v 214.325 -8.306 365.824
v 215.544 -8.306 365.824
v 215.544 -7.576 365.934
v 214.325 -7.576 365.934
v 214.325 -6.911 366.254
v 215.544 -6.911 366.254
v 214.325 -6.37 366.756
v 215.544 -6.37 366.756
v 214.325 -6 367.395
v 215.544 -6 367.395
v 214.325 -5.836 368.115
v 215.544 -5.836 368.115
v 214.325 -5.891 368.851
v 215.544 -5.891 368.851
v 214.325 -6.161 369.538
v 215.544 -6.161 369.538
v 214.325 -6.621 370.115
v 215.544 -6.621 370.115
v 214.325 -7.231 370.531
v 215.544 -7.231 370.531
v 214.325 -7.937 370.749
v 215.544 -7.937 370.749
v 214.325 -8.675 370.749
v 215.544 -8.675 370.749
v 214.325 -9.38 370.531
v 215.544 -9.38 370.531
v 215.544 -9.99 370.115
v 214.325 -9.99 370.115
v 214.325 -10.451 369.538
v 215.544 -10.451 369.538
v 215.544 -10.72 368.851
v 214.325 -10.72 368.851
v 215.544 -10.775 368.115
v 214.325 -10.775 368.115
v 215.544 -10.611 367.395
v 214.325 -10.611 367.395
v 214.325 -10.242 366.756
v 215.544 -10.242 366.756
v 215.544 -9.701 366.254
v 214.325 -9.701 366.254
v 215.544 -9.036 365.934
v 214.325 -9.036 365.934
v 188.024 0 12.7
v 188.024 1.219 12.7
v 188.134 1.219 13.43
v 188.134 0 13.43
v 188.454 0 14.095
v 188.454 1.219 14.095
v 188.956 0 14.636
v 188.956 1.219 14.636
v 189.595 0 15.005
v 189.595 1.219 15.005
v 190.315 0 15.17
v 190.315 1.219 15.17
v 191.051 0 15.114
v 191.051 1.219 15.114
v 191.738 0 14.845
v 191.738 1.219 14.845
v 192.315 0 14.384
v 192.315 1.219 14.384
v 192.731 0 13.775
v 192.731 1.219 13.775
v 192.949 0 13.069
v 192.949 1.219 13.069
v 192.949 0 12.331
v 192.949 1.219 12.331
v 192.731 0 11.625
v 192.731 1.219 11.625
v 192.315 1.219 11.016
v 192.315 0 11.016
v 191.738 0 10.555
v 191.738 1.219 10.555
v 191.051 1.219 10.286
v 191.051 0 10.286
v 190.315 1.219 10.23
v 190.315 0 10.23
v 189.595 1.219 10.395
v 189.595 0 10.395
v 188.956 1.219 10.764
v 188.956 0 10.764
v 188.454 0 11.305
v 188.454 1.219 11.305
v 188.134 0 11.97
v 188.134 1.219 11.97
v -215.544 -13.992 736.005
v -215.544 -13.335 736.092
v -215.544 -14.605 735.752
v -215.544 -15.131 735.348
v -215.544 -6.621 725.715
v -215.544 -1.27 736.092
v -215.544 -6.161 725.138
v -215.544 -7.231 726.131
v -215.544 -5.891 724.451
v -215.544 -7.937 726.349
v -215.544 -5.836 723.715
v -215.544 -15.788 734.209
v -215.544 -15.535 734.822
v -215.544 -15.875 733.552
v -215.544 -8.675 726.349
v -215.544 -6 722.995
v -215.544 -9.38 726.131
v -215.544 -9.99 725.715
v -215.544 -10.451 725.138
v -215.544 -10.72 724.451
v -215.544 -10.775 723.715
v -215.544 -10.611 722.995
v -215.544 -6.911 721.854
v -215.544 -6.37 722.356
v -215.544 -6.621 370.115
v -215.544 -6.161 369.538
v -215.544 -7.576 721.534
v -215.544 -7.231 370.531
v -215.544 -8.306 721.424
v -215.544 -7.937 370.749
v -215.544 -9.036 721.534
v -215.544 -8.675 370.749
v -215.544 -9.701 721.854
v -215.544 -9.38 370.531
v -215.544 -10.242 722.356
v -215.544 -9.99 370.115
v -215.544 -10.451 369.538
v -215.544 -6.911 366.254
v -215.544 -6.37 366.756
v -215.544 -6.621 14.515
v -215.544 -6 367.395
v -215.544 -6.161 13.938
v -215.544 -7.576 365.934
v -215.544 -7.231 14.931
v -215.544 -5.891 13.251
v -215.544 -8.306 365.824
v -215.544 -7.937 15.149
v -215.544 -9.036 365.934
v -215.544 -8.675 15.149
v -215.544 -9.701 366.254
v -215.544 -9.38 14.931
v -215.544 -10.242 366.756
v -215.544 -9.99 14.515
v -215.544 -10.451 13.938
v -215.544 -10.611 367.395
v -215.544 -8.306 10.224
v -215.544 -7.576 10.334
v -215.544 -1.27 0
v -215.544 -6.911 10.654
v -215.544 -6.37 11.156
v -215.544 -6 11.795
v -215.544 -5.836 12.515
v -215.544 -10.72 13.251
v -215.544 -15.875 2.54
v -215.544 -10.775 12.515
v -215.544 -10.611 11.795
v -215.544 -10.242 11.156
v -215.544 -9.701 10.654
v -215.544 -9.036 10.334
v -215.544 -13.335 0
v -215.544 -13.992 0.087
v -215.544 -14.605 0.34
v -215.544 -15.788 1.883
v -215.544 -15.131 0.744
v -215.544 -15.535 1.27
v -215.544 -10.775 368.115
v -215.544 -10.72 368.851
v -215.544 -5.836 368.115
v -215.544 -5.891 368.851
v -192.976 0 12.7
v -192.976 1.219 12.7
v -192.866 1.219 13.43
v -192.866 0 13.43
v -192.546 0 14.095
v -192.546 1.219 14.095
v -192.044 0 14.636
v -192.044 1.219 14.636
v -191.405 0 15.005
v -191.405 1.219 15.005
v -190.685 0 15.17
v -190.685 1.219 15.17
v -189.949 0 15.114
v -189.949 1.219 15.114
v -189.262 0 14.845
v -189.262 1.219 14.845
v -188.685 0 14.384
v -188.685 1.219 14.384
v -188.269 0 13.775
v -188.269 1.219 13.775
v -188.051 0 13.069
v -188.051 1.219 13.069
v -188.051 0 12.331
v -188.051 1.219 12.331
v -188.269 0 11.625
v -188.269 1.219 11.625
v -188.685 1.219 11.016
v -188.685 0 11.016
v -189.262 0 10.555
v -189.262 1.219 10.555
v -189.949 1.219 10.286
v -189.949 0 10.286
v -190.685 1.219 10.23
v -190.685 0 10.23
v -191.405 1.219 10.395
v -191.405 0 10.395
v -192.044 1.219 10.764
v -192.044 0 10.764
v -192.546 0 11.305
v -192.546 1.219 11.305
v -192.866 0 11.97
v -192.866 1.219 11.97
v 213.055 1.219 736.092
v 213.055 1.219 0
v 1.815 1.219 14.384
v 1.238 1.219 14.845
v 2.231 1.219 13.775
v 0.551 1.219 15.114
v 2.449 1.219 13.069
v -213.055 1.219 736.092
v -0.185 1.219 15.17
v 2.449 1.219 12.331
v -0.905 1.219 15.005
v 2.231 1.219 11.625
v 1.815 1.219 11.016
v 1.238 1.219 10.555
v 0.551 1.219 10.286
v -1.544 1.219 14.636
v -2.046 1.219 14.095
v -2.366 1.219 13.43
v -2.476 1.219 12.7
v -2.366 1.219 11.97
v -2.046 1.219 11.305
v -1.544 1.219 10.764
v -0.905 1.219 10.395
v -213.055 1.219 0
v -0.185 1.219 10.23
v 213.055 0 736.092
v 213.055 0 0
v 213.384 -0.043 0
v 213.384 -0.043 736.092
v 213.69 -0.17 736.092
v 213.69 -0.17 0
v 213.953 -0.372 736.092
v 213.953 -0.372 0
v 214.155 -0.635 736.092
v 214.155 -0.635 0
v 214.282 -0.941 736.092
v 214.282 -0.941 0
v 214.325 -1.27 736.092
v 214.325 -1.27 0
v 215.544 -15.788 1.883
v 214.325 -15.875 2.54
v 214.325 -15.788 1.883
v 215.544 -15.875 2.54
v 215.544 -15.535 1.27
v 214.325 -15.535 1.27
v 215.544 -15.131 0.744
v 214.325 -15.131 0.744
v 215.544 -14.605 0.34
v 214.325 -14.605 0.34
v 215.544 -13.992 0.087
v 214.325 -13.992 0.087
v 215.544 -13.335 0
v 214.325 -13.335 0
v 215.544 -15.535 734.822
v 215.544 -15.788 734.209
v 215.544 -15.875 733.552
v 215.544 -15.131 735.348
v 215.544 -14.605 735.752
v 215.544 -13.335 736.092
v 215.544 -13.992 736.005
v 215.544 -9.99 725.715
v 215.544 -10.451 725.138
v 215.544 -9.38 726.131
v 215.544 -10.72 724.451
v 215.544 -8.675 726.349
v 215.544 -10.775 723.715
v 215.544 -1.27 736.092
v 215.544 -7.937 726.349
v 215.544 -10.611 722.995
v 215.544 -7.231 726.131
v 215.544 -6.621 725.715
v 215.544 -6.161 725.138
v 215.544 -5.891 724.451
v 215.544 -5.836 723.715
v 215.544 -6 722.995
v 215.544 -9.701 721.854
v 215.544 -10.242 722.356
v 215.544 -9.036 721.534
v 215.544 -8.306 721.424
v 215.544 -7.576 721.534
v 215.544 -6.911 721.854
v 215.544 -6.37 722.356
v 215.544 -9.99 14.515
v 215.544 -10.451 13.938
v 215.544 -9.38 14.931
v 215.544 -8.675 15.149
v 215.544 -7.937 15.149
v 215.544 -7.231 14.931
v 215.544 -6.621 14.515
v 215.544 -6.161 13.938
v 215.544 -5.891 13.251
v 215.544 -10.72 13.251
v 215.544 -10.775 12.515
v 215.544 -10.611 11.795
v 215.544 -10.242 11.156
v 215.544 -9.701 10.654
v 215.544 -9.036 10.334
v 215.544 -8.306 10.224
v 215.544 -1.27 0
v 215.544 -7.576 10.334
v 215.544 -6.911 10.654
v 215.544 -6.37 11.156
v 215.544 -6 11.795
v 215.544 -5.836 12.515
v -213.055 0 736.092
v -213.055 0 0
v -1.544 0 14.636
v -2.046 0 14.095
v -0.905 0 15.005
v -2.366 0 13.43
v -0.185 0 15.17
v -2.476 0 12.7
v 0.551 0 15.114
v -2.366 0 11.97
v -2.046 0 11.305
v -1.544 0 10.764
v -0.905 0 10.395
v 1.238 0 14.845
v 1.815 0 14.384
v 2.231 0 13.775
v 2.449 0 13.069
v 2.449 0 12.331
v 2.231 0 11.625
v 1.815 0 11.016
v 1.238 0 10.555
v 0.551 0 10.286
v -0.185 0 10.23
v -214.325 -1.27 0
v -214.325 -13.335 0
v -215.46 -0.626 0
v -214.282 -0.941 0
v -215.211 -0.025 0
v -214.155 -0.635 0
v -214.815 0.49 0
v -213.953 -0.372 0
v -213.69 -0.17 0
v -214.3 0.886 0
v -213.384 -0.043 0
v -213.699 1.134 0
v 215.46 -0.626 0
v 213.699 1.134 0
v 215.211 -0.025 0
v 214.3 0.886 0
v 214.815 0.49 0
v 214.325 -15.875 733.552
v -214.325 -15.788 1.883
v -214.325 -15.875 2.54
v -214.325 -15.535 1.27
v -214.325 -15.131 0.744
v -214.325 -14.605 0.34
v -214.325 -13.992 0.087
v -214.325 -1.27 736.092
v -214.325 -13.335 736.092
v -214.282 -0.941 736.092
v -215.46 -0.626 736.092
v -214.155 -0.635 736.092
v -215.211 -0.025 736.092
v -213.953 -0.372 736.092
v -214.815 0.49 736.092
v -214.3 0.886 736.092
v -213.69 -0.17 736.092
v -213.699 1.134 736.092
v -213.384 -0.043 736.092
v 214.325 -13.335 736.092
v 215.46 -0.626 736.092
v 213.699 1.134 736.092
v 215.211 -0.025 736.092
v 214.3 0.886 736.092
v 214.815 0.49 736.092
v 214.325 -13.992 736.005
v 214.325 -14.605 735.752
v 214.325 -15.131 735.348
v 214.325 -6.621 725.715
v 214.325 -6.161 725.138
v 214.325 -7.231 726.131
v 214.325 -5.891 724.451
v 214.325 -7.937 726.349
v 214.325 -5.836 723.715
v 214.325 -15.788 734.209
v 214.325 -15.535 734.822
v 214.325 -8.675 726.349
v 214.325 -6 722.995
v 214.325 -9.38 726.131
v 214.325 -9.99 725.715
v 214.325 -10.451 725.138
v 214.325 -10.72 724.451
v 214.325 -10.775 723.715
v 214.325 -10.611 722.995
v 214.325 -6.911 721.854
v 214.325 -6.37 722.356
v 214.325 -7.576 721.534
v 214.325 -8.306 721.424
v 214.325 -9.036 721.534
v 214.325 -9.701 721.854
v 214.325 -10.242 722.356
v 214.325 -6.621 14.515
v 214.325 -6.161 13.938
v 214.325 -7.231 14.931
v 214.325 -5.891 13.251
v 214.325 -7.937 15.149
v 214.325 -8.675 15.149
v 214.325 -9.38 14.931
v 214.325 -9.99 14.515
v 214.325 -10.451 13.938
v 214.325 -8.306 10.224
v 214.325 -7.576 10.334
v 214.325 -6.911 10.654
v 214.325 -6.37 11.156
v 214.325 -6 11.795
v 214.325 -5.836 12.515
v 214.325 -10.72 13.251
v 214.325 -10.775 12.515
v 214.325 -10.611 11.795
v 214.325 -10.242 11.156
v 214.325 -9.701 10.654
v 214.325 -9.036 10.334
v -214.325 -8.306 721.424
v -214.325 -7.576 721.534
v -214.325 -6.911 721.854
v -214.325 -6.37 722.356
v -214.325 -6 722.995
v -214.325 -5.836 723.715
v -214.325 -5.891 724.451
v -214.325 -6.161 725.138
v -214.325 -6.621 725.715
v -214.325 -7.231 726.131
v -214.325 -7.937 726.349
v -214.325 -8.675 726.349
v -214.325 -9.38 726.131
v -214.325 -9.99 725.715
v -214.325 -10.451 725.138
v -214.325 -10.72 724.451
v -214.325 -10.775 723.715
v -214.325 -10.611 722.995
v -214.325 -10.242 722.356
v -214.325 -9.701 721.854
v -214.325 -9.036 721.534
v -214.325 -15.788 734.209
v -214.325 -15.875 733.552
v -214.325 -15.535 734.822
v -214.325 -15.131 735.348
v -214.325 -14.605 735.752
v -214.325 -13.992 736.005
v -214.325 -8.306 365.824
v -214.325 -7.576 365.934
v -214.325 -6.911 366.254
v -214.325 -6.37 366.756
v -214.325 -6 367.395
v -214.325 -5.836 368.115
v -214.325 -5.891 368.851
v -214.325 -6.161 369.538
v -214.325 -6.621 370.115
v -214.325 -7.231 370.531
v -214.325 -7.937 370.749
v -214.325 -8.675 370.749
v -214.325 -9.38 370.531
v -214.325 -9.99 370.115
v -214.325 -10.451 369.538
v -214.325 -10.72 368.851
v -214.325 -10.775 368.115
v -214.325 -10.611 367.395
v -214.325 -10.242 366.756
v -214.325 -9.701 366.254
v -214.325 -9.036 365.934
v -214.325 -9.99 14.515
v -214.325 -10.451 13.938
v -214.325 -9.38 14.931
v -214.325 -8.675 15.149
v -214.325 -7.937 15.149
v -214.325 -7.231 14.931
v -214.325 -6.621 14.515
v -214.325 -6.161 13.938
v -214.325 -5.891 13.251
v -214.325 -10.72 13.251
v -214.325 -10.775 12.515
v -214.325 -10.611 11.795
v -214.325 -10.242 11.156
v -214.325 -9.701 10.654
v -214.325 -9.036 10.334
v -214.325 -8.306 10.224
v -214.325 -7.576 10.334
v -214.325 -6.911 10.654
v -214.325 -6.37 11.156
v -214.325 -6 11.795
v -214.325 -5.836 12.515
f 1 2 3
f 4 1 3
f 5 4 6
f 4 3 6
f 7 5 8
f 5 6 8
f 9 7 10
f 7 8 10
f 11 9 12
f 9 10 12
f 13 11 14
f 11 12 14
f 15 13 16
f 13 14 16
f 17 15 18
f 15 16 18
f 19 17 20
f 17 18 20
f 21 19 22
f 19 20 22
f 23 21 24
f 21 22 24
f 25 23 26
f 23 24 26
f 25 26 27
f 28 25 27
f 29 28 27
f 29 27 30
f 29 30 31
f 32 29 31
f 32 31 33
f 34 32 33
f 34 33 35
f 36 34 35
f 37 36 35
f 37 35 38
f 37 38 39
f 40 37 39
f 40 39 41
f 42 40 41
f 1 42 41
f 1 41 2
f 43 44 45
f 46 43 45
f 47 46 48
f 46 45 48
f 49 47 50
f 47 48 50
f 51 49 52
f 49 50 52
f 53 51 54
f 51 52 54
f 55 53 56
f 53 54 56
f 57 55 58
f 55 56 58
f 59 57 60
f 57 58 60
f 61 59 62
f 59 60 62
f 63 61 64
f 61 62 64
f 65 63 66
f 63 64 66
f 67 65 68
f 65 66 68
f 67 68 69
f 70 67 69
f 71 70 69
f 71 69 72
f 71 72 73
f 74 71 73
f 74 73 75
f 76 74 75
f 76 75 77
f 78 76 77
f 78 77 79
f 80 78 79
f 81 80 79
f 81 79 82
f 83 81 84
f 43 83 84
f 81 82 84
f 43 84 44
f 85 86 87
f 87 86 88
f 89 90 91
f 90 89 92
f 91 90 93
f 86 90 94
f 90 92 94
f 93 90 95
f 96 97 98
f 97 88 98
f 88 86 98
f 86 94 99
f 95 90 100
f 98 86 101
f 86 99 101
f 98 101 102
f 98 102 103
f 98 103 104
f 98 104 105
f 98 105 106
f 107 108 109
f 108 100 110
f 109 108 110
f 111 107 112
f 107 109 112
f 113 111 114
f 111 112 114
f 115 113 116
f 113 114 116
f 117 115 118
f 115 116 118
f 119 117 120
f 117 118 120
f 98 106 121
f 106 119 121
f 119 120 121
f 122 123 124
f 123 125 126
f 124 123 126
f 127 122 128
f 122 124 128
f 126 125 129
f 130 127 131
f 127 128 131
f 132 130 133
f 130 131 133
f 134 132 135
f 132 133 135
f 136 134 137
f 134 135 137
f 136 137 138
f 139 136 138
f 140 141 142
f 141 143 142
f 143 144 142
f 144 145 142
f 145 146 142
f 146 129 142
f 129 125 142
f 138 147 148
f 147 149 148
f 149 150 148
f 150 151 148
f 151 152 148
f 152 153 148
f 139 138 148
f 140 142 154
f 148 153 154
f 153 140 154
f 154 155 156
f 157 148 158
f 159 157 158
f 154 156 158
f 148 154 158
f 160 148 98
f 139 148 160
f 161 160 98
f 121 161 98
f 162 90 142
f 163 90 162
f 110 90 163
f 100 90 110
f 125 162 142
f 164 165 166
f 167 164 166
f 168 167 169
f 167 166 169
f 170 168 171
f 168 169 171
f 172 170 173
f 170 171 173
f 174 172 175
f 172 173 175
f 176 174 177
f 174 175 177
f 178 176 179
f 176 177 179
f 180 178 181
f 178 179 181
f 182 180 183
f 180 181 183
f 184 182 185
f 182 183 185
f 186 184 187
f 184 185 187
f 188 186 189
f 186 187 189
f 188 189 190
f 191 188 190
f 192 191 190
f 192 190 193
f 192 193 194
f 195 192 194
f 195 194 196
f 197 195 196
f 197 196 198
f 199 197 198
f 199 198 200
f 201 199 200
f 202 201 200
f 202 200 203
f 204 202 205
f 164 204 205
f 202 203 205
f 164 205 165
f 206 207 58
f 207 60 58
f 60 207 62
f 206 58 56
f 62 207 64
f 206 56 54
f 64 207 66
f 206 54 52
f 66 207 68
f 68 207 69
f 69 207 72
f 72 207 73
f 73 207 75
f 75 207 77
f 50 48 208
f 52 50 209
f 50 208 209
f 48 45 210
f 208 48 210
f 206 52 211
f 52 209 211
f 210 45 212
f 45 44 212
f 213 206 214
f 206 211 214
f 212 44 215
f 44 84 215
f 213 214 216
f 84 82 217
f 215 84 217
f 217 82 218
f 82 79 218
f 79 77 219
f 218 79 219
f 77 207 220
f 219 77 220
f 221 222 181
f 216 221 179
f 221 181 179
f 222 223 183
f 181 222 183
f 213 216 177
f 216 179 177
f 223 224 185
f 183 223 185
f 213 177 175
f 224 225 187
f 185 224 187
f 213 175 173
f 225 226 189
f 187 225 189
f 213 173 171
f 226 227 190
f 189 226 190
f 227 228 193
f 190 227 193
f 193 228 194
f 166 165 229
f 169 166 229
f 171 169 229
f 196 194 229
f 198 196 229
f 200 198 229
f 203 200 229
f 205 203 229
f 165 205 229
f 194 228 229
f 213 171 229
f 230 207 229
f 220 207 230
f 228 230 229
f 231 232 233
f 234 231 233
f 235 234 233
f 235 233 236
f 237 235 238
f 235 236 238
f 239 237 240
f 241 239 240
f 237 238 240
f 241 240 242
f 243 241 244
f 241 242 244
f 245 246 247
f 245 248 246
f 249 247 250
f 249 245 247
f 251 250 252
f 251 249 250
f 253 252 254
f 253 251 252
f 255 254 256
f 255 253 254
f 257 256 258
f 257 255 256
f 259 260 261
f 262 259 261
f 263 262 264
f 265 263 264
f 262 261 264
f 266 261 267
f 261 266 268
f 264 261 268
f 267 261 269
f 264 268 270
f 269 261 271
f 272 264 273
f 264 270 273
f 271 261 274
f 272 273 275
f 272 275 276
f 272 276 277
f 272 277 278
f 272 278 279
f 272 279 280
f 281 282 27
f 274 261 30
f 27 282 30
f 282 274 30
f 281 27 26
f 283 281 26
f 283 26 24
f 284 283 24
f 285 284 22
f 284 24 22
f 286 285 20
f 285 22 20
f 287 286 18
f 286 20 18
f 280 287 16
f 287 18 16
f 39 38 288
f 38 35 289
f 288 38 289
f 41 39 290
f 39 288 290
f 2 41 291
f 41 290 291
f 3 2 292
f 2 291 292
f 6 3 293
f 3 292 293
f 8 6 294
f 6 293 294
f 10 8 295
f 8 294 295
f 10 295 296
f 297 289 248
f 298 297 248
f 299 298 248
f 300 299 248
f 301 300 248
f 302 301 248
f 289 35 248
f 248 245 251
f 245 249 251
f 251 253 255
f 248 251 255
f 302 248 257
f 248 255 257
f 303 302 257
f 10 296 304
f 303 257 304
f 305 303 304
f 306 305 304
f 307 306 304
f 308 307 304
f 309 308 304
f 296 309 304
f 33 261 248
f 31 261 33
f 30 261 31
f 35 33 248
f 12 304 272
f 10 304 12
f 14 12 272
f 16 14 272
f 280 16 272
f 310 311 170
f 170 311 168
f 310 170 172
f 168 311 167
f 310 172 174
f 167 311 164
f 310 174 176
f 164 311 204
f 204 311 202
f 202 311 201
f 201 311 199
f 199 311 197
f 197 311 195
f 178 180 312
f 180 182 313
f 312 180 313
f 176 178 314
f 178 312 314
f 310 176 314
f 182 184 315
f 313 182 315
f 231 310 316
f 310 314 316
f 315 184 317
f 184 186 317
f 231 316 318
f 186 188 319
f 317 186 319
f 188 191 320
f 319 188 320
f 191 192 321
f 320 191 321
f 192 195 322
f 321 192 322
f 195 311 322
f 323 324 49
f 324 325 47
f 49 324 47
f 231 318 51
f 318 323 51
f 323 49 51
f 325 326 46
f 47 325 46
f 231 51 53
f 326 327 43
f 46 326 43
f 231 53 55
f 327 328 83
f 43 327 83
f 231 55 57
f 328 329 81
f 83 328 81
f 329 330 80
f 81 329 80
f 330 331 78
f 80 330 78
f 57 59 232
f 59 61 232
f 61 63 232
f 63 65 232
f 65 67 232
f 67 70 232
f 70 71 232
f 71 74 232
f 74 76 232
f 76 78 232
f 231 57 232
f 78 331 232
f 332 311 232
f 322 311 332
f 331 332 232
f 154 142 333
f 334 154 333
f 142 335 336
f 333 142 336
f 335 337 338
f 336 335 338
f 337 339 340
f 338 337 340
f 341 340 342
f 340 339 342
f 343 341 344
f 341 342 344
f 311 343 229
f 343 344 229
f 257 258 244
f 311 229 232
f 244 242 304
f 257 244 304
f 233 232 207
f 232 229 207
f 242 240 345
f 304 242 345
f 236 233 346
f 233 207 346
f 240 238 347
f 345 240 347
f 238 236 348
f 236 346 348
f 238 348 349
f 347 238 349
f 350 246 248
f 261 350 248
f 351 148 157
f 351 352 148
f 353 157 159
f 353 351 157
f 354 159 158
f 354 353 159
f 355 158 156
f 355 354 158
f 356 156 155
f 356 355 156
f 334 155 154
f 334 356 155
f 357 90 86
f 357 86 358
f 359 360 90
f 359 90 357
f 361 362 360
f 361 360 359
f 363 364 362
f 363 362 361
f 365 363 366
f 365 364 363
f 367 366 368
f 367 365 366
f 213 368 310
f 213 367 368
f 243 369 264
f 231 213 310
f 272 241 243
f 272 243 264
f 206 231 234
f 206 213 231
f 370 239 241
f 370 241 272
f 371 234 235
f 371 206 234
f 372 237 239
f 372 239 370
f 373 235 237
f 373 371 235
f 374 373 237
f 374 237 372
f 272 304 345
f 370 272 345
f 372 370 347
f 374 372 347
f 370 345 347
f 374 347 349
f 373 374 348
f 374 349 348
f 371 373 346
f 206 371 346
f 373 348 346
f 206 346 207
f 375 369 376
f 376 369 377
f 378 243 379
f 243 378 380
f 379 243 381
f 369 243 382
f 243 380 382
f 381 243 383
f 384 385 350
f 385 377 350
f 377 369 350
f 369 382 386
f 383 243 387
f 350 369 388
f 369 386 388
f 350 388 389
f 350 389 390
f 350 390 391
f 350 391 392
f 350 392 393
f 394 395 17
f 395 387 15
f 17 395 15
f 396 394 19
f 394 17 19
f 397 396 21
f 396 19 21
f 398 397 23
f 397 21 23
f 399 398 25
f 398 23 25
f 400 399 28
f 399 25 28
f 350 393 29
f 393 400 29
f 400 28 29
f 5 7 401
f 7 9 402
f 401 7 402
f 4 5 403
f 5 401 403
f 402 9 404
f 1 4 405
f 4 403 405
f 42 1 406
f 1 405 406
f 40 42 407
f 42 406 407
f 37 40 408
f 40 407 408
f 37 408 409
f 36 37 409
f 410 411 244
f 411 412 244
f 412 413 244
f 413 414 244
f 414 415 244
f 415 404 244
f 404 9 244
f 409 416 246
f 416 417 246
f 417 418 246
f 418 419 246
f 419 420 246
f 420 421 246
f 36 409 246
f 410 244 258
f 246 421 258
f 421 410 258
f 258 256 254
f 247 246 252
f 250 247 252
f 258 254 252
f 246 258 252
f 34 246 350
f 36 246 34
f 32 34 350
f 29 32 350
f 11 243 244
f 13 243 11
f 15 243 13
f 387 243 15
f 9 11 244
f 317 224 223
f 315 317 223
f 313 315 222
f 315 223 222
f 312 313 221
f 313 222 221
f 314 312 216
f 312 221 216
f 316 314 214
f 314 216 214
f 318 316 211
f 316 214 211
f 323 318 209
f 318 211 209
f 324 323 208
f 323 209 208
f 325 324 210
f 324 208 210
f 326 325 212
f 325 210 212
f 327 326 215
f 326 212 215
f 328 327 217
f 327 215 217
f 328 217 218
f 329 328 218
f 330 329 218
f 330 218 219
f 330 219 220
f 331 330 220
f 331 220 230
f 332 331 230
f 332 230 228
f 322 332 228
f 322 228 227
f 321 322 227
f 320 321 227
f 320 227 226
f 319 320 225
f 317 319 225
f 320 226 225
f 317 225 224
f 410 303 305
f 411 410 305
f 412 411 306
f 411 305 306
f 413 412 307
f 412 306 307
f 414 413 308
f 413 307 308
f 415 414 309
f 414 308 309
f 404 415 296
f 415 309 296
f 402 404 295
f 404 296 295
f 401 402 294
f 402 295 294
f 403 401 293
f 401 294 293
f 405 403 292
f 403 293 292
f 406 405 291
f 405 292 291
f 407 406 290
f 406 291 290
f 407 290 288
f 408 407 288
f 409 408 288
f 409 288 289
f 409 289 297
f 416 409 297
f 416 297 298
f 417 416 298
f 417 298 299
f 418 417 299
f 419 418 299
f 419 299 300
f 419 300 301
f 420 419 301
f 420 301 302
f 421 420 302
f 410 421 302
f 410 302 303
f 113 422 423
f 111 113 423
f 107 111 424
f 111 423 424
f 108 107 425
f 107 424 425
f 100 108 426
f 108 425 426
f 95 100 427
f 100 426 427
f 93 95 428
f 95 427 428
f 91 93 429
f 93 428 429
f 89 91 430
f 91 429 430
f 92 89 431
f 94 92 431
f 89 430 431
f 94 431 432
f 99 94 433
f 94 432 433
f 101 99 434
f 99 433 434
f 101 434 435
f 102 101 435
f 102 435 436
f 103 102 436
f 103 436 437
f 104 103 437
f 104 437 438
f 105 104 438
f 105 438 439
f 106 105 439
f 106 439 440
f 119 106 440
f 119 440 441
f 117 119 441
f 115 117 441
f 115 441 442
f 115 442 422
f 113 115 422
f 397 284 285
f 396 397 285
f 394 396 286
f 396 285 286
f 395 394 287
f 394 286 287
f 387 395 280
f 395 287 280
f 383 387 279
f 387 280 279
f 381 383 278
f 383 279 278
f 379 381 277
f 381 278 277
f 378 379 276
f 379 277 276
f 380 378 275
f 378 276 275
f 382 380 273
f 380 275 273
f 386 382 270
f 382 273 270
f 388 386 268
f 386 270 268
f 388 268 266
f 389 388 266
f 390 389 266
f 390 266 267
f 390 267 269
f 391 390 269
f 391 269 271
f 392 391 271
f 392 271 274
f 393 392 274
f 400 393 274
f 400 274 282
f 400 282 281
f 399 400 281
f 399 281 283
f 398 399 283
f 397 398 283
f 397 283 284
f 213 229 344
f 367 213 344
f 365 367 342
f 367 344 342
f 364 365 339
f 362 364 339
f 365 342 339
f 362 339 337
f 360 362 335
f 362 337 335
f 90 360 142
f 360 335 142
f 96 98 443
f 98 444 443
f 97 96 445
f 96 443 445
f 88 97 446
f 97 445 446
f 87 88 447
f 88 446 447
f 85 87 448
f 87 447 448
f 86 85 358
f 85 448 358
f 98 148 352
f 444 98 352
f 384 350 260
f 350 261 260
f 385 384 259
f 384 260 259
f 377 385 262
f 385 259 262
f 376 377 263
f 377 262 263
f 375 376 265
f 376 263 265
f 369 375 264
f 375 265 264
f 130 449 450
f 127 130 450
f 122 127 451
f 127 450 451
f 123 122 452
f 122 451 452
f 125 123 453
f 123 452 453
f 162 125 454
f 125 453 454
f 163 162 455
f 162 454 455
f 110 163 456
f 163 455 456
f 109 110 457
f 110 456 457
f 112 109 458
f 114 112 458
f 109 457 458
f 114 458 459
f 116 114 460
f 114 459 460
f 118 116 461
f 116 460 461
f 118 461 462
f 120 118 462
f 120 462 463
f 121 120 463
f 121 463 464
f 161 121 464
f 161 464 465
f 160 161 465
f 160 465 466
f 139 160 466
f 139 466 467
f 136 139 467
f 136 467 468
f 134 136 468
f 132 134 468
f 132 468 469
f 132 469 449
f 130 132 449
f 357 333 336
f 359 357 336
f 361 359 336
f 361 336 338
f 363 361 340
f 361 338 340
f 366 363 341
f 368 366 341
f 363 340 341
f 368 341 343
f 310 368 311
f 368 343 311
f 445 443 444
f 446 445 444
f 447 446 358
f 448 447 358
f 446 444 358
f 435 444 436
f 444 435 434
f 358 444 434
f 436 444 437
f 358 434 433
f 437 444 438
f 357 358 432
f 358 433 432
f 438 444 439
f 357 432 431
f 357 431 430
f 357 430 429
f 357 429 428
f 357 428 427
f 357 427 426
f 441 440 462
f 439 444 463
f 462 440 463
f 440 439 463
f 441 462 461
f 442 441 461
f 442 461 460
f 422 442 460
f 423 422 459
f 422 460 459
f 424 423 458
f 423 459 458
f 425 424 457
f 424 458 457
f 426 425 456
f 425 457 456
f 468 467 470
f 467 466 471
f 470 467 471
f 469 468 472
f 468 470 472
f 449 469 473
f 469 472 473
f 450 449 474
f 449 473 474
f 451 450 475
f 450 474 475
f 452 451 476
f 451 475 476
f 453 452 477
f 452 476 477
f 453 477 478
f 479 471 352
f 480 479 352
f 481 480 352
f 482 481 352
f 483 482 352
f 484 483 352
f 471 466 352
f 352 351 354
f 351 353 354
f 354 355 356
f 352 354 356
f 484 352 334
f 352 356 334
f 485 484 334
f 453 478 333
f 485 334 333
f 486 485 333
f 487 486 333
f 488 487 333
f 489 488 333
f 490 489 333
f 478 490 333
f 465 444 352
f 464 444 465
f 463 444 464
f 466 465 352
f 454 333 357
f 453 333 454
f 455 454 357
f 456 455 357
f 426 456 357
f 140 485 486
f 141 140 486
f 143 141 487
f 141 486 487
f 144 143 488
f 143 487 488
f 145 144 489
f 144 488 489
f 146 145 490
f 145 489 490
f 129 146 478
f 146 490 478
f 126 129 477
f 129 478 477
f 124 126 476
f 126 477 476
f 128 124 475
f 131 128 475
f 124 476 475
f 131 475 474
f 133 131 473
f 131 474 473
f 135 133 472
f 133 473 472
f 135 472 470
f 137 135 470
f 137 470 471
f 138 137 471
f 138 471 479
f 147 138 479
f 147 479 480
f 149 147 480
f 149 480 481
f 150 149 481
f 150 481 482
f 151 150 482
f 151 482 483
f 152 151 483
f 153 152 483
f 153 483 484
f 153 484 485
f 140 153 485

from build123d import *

# Parameters (mm, degrees)
BASE_FLANGE1_DEPTH = 736.092
FILLET1_R          = 2.54
SKETCH3_R          = 2.4765
CUT_EXTRUDE1_DEPTH = 854.182865261
SKETCH4_R          = 2.4765
CUT_EXTRUDE2_DEPTH = 1.2192


# Sheet-metal steps are written as plain solids
with BuildPart() as part:
    # Sketch1 → Base-Flange1 (new body)
    with BuildSketch(Plane.XY):
        with BuildLine():
            Line((-214.3252, -15.875), (-214.3252, -1.27))
            ThreePointArc((-214.3252, -1.27), (-213.953225612, -0.371974388), (-213.0552, 0))
            Line((-213.0552, 0), (213.0552, 0))
            ThreePointArc((213.0552, 0), (213.953225612, -0.371974388), (214.3252, -1.27))
            Line((214.3252, -1.27), (214.3252, -15.875))
            Line((214.3252, -15.875), (215.5444, -15.875))
            Line((215.5444, -15.875), (215.5444, -1.27))
            ThreePointArc((215.5444, -1.27), (214.8153302, 0.4901302), (213.0552, 1.2192))
            Line((213.0552, 1.2192), (-213.0552, 1.2192))
            ThreePointArc((-213.0552, 1.2192), (-214.8153302, 0.4901302), (-215.5444, -1.27))
            Line((-215.5444, -1.27), (-215.5444, -15.875))
            Line((-215.5444, -15.875), (-214.3252, -15.875))
        make_face()
    extrude(amount=BASE_FLANGE1_DEPTH)

    # Fillet1
    fillet1_edges = [part.edges().sort_by_distance(p)[0] for p in [
        (-214.9348, -15.875, 0),
        (214.9348, -15.875, 0),
        (214.9348, -15.875, 736.092),
        (-214.9348, -15.875, 736.092),
    ]]
    fillet(fillet1_edges, radius=FILLET1_R)

    # Sketch3 → Cut-Extrude1 (cut, through all)
    with BuildSketch(Plane(origin=(215.5444, 0, 0), x_dir=(0, 0, -1), z_dir=(1, 0, 0))):
        with Locations((-368.3, -8.3058)):
            Circle(SKETCH3_R)
        with Locations((-723.9, -8.3058)):
            Circle(SKETCH3_R)
        with Locations((-12.7, -8.3058)):
            Circle(SKETCH3_R)
    extrude(amount=-CUT_EXTRUDE1_DEPTH, mode=Mode.SUBTRACT)

    # Sketch4 → Cut-Extrude2 (cut)
    with BuildSketch(Plane(origin=(0, 1.2192, 0), x_dir=(1, 0, 0), z_dir=(0, 1, 0))):
        with Locations(Location((-190.5, -12.7, 0), (0, 0, 180))):
            Circle(SKETCH4_R)
        with Locations(Location((0, -12.7, 0), (0, 0, 180))):
            Circle(SKETCH4_R)
        with Locations(Location((190.5, -12.7, 0), (0, 0, 180))):
            Circle(SKETCH4_R)
    extrude(amount=-CUT_EXTRUDE2_DEPTH, mode=Mode.SUBTRACT)


solid = part.part
